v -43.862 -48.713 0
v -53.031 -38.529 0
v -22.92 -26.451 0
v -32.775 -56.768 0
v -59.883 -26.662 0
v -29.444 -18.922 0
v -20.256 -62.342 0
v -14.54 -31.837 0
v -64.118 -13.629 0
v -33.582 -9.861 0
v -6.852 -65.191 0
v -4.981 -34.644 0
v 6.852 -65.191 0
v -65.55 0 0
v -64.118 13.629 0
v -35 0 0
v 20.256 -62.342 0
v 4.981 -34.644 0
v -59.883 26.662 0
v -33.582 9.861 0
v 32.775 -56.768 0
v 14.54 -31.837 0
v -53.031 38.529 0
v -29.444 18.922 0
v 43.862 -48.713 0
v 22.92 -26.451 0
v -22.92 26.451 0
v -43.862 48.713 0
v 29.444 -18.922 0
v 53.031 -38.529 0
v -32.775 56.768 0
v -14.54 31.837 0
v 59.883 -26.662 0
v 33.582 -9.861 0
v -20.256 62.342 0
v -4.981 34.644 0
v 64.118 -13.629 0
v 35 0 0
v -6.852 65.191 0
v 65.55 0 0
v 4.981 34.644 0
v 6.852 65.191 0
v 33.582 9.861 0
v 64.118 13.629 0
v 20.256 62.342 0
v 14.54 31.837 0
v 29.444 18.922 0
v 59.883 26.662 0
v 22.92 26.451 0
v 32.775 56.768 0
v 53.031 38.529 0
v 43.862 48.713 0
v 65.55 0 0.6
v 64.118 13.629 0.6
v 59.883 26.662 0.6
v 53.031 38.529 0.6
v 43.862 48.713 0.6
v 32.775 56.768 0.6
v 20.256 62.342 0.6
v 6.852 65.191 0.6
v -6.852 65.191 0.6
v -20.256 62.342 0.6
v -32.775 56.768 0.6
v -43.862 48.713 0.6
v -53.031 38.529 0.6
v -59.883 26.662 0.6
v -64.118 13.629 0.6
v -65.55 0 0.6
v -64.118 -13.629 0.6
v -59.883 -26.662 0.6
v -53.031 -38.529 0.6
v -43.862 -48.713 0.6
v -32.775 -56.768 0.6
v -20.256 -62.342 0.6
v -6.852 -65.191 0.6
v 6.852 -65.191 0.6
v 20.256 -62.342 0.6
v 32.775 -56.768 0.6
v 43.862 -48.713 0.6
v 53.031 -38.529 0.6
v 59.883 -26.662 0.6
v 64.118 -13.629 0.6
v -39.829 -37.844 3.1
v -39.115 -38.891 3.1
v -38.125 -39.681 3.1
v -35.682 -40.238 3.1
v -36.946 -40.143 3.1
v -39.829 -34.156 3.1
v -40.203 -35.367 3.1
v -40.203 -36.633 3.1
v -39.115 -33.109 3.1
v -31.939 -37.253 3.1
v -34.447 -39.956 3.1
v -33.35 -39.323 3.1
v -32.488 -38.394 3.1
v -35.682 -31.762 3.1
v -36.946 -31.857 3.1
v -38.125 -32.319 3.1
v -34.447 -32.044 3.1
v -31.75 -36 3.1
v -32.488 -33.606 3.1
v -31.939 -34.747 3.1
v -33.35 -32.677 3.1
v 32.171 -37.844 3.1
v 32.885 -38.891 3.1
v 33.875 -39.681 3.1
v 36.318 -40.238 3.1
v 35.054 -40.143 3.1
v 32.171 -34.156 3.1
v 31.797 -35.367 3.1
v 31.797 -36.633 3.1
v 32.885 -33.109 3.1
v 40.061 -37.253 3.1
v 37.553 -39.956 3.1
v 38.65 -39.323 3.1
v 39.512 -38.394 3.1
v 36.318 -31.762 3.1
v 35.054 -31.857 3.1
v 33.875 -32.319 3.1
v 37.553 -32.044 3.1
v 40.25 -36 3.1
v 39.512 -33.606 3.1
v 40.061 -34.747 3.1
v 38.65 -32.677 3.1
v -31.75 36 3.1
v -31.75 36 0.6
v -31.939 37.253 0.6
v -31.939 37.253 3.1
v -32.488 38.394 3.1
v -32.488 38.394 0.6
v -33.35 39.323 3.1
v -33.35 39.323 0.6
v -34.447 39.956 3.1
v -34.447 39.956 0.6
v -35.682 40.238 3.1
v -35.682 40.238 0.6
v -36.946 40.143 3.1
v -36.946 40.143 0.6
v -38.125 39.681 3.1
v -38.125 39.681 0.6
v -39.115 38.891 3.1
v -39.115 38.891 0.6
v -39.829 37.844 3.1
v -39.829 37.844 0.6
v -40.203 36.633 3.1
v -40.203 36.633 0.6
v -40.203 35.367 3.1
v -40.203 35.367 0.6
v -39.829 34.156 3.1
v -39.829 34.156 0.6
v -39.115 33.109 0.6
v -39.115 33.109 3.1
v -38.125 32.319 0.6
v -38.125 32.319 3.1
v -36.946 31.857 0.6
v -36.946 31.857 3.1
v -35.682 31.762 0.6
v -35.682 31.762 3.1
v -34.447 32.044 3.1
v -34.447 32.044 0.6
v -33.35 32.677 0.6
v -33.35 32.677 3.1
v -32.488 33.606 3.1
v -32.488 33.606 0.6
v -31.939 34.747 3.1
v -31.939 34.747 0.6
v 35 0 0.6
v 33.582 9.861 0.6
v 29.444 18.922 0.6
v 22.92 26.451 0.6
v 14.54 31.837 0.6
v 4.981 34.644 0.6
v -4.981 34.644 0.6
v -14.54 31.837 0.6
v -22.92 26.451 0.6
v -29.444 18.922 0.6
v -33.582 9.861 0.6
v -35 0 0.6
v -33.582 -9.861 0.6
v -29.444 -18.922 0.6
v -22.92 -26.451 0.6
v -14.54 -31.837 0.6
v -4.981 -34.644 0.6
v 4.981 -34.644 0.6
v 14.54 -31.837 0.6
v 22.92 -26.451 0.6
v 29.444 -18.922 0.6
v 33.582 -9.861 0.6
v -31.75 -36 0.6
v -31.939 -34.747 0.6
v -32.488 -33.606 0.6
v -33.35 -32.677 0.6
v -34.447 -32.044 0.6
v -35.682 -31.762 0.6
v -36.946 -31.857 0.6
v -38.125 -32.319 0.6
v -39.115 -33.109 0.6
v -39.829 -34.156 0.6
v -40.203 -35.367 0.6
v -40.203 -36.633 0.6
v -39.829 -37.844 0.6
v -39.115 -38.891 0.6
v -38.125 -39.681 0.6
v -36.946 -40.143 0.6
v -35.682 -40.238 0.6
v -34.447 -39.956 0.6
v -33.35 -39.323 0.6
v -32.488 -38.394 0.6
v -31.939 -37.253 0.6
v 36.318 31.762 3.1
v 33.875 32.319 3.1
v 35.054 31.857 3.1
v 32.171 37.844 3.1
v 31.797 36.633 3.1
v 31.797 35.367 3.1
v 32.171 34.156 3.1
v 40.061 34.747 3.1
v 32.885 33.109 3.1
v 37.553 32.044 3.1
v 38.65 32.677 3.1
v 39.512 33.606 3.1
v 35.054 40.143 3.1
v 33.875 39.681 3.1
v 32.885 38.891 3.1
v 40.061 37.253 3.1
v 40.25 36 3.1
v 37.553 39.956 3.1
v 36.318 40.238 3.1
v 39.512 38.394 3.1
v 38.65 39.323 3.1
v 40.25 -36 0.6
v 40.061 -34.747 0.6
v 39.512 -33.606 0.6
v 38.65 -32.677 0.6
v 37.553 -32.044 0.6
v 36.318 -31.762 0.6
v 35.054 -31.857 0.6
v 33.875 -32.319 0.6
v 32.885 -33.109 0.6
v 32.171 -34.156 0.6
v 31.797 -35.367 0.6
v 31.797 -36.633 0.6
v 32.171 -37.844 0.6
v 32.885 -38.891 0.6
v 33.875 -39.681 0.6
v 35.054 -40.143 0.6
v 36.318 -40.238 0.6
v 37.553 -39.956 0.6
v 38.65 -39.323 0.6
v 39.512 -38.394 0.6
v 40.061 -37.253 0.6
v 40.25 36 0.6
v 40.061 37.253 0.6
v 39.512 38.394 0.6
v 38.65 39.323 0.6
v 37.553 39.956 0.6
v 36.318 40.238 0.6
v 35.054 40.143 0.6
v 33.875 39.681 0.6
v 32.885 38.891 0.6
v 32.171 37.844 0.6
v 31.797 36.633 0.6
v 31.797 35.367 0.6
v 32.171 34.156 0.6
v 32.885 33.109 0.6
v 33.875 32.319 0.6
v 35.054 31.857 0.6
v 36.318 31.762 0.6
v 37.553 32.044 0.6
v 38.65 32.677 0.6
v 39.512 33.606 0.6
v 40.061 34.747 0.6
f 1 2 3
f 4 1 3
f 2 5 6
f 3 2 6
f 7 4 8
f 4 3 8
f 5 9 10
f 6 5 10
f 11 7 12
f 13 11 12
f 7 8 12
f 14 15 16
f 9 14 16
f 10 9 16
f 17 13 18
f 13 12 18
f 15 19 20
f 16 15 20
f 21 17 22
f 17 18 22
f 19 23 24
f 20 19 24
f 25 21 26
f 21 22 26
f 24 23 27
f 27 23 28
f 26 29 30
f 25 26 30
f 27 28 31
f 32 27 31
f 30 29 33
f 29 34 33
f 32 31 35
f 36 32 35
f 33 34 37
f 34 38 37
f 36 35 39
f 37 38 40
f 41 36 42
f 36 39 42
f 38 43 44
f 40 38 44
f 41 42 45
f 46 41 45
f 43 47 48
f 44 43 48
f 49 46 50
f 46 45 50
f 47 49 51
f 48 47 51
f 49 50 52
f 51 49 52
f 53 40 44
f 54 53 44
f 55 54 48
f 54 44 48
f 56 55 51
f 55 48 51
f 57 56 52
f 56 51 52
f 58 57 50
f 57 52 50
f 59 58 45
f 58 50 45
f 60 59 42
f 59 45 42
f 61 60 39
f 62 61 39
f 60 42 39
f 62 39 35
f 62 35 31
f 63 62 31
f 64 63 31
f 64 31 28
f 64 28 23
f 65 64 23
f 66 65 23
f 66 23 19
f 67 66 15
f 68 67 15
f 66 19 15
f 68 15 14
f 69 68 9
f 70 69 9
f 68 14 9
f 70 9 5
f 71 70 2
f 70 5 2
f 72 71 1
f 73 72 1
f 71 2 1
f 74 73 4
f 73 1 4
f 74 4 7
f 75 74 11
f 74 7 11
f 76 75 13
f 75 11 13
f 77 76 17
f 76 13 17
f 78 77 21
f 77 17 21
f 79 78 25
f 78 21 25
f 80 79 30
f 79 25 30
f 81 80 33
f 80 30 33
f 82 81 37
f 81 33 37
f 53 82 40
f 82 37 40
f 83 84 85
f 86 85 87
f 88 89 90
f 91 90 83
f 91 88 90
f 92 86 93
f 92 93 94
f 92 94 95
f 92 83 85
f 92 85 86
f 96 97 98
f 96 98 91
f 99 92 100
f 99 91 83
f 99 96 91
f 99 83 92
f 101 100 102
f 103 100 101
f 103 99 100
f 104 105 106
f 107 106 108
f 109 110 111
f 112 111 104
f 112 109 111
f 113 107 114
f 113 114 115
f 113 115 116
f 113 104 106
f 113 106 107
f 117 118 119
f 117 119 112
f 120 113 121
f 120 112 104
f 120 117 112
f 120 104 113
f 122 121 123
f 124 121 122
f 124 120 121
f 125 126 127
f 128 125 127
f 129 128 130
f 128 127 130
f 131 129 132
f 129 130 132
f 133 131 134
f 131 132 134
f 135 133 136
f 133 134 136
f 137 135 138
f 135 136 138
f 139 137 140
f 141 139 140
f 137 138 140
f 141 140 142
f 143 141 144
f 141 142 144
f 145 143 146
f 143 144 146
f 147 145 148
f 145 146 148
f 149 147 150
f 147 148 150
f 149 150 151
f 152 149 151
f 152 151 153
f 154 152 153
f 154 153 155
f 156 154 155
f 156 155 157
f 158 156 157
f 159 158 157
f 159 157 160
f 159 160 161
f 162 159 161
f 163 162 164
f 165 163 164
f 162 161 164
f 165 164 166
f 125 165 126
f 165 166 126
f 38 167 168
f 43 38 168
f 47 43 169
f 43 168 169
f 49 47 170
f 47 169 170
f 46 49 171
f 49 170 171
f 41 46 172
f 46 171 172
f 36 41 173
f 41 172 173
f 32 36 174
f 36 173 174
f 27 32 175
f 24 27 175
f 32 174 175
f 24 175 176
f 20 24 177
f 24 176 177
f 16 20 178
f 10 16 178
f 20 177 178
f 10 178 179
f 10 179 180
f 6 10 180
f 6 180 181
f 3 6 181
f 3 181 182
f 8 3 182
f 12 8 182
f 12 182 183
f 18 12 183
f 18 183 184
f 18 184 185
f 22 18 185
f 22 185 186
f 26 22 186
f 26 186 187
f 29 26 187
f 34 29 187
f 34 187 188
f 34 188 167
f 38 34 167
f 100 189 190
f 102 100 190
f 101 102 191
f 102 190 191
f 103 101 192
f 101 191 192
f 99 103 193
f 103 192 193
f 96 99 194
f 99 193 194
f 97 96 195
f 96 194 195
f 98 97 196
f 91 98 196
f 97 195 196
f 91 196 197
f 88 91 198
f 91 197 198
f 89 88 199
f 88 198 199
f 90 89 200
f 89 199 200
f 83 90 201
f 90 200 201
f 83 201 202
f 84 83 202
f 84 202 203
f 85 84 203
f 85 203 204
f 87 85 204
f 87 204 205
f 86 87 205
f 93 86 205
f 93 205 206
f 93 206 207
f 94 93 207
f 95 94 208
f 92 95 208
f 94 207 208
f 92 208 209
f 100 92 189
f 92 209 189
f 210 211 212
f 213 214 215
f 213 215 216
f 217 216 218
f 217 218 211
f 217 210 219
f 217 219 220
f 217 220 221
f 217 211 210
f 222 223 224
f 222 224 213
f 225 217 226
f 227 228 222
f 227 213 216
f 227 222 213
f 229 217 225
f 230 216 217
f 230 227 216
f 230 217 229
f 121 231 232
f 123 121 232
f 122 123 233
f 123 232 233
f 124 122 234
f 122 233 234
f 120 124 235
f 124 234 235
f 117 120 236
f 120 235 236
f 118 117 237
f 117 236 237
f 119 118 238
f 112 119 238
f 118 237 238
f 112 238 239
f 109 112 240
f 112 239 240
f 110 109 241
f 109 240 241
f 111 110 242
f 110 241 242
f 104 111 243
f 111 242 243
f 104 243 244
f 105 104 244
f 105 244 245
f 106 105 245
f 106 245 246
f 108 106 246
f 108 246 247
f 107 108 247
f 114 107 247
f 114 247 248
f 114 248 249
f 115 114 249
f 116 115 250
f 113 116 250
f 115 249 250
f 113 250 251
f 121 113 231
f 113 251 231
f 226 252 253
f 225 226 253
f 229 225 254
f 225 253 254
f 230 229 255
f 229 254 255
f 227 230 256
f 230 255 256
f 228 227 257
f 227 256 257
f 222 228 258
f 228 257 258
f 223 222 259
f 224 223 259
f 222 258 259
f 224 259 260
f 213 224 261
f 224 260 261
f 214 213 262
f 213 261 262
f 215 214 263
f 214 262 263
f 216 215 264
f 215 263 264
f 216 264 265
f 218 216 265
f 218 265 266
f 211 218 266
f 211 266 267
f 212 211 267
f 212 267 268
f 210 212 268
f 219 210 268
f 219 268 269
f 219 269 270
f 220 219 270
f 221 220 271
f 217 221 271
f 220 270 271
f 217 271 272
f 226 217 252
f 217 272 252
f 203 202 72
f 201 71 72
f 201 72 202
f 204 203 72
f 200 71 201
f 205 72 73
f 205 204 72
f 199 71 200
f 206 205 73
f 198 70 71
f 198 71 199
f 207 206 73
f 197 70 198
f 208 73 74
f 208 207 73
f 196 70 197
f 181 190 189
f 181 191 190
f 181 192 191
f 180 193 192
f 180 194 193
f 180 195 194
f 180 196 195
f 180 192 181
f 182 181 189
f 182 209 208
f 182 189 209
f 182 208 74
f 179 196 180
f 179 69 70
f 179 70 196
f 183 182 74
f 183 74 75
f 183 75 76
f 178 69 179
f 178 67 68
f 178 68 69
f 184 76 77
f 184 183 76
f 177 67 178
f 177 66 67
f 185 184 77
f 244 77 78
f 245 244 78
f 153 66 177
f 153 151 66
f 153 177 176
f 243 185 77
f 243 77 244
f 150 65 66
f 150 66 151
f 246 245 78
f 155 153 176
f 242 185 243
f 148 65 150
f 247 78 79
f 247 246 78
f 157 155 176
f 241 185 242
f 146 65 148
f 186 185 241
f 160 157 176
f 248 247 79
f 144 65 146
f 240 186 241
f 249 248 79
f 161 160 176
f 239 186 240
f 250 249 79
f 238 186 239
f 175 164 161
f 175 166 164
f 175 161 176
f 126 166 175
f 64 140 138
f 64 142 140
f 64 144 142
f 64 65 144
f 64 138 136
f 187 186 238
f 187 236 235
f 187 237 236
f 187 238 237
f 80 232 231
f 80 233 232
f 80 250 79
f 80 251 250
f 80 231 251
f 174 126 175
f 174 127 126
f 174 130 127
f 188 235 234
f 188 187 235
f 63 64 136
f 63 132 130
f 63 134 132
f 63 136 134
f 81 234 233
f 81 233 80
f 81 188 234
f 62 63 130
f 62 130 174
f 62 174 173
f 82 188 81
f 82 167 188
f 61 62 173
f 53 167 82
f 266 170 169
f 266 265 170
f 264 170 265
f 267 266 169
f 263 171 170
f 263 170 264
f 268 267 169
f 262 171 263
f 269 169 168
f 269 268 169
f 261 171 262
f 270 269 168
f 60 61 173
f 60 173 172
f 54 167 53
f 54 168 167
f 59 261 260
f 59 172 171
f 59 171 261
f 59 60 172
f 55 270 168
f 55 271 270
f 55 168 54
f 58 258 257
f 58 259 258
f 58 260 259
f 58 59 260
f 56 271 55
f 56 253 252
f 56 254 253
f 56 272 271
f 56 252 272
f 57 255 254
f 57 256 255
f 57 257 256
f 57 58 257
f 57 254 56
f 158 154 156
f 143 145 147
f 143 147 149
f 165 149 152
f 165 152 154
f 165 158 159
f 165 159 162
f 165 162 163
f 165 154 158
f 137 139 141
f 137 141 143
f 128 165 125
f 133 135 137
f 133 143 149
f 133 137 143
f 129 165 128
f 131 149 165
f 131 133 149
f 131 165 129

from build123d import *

# Parameters (mm, degrees)
F0_R     = 65.55
F1_DEPTH = 0.6
F2_R     = 4.25
F3_DEPTH = 2.5
F4_R     = 35
F5_DEPTH = 0.601


with BuildPart() as f1:
    # F0 (on Top) → F1 (new body)
    with BuildSketch(Plane.XY):
        Circle(F0_R)
    extrude(amount=F1_DEPTH)

    # F2 (on face) → F3 (join)
    with BuildSketch(Plane.XY.offset(0.6)):
        with Locations((-36, 36)):
            Circle(F2_R)
        with Locations((36, 36)):
            Circle(F2_R)
        with Locations((36, -36)):
            Circle(F2_R)
        with Locations((-36, -36)):
            Circle(F2_R)
    extrude(amount=F3_DEPTH)

    # F4 (on face) → F5 (cut, through all)
    with BuildSketch(Plane.XY.offset(0.6)):
        Circle(F4_R)
    extrude(amount=-F5_DEPTH, mode=Mode.SUBTRACT)


solid = f1.part
